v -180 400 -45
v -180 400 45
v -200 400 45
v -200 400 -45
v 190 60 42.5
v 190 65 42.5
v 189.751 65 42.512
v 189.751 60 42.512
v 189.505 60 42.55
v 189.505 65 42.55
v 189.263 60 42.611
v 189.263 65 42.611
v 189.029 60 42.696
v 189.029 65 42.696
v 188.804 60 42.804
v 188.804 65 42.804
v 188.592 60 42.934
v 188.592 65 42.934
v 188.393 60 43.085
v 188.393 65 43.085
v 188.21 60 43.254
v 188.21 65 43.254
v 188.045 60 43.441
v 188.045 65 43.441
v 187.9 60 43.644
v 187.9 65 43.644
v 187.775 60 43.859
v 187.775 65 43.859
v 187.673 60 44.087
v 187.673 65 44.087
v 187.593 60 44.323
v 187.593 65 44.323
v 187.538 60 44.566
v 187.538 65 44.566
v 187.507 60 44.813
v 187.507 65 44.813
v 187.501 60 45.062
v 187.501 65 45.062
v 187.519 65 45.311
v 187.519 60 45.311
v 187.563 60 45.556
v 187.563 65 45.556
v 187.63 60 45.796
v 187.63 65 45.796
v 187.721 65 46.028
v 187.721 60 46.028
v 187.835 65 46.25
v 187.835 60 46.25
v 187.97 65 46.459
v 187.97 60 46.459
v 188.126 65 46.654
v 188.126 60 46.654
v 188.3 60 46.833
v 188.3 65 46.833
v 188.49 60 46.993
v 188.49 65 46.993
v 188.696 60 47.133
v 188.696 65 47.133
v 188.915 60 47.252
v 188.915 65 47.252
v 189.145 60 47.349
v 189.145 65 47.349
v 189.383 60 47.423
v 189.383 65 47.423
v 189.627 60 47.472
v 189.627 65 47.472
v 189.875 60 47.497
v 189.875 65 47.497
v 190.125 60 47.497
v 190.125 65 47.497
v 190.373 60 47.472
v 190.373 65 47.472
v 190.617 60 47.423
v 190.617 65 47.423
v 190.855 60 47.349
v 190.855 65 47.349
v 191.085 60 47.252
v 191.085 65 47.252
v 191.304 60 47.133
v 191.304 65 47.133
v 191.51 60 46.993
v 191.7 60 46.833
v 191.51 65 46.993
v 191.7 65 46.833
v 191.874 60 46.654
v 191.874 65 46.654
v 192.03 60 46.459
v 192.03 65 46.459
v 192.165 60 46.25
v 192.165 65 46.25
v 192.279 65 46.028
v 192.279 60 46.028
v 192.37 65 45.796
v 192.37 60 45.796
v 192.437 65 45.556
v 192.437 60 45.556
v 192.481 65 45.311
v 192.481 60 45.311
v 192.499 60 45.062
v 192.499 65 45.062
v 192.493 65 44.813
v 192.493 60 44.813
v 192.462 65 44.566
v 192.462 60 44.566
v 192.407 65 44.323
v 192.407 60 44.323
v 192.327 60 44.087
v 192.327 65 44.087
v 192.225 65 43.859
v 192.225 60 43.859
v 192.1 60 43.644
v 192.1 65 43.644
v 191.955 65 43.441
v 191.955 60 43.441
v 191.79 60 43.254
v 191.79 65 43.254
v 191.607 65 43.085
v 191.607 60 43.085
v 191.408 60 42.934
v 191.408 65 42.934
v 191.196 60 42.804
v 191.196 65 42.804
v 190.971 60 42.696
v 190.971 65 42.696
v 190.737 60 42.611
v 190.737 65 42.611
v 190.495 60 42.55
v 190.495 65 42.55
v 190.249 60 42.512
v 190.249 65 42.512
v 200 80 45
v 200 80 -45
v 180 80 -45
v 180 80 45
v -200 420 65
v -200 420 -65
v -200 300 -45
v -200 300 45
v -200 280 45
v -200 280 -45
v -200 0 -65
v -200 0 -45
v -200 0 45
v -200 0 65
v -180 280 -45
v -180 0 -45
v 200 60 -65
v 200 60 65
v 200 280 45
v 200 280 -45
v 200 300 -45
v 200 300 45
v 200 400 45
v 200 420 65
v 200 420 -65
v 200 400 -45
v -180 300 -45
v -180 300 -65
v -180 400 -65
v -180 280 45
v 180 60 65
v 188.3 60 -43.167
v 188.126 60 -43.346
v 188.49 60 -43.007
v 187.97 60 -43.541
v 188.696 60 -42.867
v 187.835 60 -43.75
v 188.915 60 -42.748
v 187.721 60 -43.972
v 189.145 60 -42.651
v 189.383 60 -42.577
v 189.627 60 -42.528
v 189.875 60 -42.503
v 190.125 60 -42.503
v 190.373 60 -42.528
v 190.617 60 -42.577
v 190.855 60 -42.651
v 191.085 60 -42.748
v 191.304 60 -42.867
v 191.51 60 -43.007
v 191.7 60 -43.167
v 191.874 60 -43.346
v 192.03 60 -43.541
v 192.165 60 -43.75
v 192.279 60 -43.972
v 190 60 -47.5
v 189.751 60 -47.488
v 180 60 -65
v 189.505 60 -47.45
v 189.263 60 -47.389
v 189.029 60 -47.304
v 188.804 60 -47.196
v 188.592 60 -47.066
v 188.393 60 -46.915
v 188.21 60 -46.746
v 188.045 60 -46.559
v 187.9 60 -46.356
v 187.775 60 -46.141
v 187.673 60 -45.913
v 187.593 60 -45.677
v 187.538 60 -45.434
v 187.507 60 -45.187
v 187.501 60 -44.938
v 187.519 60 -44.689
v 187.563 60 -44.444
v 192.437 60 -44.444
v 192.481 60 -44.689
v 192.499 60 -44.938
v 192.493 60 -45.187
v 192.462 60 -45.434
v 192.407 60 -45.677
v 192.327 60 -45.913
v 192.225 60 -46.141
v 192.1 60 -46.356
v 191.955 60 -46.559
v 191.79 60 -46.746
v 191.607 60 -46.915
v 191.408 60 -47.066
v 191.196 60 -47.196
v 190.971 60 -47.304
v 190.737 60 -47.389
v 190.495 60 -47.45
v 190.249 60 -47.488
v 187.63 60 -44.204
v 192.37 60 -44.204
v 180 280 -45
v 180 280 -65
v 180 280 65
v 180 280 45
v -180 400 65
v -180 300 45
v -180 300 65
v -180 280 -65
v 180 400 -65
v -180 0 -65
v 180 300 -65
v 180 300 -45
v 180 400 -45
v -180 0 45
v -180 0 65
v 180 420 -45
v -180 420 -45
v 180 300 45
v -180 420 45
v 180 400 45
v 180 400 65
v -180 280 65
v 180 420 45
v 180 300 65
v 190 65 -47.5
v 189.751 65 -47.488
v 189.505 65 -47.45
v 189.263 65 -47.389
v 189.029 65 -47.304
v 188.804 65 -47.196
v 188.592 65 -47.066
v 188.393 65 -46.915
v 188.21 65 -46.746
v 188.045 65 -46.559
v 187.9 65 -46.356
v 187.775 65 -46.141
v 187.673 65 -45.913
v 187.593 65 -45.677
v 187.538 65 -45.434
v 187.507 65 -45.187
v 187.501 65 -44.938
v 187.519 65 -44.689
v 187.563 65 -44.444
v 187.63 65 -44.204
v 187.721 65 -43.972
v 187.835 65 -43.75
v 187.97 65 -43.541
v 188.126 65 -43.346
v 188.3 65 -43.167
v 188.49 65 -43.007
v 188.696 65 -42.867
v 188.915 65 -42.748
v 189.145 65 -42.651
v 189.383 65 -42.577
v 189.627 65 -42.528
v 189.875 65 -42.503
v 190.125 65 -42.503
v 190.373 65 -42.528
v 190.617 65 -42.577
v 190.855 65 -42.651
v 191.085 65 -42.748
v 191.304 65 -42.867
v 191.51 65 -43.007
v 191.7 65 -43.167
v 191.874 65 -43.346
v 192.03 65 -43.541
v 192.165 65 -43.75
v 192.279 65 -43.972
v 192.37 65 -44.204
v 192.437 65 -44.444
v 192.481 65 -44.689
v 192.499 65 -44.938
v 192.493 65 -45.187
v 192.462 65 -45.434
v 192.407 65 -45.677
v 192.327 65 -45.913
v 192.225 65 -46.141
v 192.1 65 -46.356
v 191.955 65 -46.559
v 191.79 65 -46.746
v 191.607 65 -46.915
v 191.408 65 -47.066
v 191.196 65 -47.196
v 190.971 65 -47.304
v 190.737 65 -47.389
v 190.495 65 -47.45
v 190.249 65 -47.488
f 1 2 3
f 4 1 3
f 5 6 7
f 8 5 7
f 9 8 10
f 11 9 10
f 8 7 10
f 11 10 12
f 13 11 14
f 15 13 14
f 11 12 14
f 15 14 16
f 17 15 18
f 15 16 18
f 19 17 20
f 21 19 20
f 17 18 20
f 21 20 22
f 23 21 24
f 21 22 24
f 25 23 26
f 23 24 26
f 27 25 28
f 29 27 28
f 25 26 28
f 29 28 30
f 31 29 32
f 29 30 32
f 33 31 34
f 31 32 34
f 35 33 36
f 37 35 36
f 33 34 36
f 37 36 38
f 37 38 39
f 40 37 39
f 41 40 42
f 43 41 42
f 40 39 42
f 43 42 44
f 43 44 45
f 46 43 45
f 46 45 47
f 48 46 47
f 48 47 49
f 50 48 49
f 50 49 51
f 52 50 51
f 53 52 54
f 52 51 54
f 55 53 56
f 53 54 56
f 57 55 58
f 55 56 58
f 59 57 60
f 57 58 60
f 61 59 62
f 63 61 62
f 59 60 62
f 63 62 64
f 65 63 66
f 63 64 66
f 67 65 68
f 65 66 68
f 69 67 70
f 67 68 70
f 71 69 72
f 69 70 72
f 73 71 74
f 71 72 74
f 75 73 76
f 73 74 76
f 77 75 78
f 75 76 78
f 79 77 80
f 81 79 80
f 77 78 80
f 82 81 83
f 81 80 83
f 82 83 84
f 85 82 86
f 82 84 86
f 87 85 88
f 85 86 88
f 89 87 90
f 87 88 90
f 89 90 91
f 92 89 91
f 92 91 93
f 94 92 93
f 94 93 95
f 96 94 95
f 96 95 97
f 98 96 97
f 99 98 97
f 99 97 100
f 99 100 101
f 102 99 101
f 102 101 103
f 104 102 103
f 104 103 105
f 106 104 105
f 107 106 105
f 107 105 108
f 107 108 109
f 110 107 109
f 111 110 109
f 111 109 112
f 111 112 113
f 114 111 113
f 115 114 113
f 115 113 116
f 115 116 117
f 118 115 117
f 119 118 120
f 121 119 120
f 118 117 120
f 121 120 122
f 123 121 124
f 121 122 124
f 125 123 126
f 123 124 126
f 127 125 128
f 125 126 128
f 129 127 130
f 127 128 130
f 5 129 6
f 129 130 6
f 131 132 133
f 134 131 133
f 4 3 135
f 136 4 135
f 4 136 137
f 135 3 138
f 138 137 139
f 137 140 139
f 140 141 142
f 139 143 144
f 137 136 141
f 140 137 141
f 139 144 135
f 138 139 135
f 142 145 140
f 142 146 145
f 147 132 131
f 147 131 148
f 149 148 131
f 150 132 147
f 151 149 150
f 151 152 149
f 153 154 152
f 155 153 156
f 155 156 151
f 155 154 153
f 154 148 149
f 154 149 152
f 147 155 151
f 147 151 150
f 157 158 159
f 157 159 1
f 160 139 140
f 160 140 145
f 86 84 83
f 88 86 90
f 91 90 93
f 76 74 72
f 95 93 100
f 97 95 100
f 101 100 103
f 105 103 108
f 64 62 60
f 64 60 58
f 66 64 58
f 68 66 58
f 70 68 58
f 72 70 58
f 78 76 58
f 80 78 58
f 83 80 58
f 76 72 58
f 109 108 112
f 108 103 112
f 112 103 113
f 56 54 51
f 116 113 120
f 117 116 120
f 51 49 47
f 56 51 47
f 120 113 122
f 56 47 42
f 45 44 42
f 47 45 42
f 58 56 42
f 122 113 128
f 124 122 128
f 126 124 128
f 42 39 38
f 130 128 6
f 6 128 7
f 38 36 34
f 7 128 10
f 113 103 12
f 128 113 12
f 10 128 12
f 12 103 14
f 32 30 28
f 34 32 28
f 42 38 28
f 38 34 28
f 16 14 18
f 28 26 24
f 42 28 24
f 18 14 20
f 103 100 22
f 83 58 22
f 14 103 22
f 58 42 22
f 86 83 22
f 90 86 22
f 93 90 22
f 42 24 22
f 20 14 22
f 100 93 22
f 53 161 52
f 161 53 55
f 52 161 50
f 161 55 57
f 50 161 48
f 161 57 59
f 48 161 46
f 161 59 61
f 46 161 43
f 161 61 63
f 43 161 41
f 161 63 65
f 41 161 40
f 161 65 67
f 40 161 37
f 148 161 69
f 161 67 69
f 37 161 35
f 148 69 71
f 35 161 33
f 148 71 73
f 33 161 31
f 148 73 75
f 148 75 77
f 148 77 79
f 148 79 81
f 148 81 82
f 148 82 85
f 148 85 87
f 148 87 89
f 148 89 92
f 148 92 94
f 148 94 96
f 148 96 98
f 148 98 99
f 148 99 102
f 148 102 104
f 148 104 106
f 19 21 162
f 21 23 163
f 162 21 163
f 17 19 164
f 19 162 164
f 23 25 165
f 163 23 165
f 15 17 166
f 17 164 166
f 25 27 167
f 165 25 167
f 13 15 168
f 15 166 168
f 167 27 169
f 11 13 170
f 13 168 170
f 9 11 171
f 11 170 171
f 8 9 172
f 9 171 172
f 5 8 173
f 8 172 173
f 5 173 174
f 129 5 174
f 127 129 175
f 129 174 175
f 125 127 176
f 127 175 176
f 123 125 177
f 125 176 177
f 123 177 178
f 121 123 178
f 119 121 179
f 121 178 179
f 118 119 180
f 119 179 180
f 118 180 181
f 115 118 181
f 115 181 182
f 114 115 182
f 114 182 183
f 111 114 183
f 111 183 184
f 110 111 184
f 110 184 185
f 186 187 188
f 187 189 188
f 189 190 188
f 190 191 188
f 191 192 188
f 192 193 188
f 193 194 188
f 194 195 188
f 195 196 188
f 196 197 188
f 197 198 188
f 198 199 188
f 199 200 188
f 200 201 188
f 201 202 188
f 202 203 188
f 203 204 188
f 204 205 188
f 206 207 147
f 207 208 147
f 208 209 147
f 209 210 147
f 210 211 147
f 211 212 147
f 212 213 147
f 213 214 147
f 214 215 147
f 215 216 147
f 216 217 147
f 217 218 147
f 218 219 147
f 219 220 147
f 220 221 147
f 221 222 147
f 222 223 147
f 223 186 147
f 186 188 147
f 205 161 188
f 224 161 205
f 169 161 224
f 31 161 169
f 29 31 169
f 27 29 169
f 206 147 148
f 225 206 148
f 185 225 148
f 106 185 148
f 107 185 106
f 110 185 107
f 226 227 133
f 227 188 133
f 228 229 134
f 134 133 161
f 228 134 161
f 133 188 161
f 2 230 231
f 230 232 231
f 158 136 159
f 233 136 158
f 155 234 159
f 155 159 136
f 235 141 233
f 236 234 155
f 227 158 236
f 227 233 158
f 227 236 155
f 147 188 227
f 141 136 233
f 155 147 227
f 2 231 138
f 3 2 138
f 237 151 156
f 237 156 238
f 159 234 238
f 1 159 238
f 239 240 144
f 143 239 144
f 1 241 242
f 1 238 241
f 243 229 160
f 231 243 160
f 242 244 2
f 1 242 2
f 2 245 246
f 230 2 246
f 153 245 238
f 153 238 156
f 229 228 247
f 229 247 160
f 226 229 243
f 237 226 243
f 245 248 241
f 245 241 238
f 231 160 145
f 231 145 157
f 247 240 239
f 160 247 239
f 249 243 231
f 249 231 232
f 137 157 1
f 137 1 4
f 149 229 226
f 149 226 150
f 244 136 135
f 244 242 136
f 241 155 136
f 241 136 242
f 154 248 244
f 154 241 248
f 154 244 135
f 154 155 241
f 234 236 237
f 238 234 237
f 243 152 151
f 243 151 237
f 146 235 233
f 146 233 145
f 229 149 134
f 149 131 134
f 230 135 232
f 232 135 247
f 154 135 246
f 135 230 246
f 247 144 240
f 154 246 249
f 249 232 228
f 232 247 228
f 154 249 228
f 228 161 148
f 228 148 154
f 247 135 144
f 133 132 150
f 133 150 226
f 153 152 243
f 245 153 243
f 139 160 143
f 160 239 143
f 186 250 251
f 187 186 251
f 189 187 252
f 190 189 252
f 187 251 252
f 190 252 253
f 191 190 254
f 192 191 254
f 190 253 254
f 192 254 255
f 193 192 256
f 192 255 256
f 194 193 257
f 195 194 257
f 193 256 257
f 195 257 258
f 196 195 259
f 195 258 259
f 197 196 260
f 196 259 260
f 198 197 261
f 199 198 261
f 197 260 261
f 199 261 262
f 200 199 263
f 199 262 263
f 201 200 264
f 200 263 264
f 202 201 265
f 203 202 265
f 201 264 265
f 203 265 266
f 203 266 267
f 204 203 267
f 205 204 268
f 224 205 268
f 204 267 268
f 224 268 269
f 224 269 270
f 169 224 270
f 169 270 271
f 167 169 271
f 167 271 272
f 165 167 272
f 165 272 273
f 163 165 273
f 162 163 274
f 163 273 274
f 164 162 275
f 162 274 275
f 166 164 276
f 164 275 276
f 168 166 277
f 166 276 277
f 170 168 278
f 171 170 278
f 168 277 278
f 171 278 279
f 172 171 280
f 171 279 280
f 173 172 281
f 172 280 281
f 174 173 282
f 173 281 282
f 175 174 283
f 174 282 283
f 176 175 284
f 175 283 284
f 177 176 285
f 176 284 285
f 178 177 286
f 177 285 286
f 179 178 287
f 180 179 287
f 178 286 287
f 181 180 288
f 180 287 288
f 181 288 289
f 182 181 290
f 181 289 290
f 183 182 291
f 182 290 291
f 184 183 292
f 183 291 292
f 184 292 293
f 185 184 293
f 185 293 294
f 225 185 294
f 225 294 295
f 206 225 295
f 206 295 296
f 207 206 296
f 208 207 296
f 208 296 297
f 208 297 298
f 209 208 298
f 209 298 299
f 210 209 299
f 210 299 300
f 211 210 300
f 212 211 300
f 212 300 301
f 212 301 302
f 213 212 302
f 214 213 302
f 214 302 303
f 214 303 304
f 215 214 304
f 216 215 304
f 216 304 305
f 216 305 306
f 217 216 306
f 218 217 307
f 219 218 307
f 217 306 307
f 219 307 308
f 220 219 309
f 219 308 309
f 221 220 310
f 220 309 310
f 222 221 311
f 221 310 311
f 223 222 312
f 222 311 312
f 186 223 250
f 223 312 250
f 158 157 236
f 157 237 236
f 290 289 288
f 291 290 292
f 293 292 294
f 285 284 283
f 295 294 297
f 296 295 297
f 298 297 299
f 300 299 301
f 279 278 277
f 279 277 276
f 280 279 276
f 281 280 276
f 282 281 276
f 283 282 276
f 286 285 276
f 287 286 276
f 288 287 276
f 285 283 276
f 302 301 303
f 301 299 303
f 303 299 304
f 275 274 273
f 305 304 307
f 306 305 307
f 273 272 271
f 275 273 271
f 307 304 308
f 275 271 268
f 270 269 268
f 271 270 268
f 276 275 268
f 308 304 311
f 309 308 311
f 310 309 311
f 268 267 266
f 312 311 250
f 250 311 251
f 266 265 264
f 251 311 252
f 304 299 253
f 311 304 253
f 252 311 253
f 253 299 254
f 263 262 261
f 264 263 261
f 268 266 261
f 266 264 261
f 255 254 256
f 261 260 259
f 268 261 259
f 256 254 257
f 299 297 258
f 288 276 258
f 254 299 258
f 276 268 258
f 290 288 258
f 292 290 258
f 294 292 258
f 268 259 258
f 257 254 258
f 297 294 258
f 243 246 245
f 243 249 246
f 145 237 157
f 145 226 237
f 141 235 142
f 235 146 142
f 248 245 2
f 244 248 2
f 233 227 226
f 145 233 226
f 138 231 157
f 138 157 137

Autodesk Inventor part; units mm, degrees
ref_plane "YZ Plane" through (0, 0, 0) normal (1, 0, 0) x (0, 1, 0)
ref_plane "XZ Plane" through (0, 0, 0) normal (0, 1, 0) x (-1, 0, 0)
ref_plane "XY Plane" through (0, 0, 0) normal (0, 0, 1) x (1, 0, 0)
sketch "Эскиз1" plane through (0, 0, 0) normal (0, 1, 0) x (-1, 0, 0)
  line L0 (-200, 65) -> (200, 65) construction
  line L1 (200, 65) -> (200, -65) construction
  line L2 (200, -65) -> (-200, -65) construction
  line L3 (-200, -65) -> (-200, 65) construction
  line L4 (-200, 65) -> (200, -65) construction
  line L5 (200, 65) -> (-200, -65) construction
  line L6 (200, 65) -> (180, 65)
  line L7 (180, 65) -> (180, 45)
  line L8 (180, 45) -> (200, 45)
  line L9 (200, 45) -> (200, 65)
  line L10 (200, -65) -> (180, -65)
  line L11 (180, -65) -> (180, -45)
  line L12 (180, -45) -> (200, -45)
  line L13 (200, -45) -> (200, -65)
  line L14 (-200, 65) -> (-180, 65)
  line L15 (-180, 65) -> (-180, 45)
  line L16 (-180, 45) -> (-200, 45)
  line L17 (-200, 45) -> (-200, 65)
  line L18 (-200, -65) -> (-180, -65)
  line L19 (-180, -65) -> (-180, -45)
  line L20 (-180, -45) -> (-200, -45)
  line L21 (-200, -45) -> (-200, -65)
  point P0 (0, 0)
  dimension "d0" = 400
  dimension "d1" = 130
  dimension "d2" = 20
  dimension "d3" = 20
  dimension "d4" = 20
  dimension "d5" = 20
  dimension "d6" = 20
  dimension "d7" = 20
  dimension "d8" = 20
  dimension "d9" = 20
extrude "Выдавливание1" add sketch "Эскиз1" along normal blind 400
sketch "Эскиз2" plane through (200, 0, 65) normal (1, 0, 0) x (0, 0, -1)
  line L0 (20, 400) -> (0, 400) projected
  line L1 (0, 400) -> (20, 400)
  line L2 (20, 400) -> (20, 420)
  line L3 (20, 420) -> (0, 420)
  line L4 (0, 420) -> (0, 400)
  line L5 (130, 0) -> (130, 400) projected
  line L6 (130, 400) -> (110, 400)
  line L7 (110, 400) -> (110, 420)
  line L8 (110, 420) -> (130, 420)
  line L9 (130, 420) -> (130, 400)
  line L10 (0, 0) -> (0, 400) projected
  line L11 (0, 280) -> (20, 280)
  line L12 (20, 280) -> (20, 300)
  line L13 (20, 300) -> (0, 300)
  line L14 (0, 300) -> (0, 280)
  line L15 (110, 300) -> (130, 300)
  line L16 (130, 300) -> (130, 280)
  line L17 (130, 280) -> (110, 280)
  line L18 (110, 280) -> (110, 300)
  point P0 (65, 0)
  point P1 (0, 300)
  dimension "d12" = 20
  dimension "d13" = 20
  dimension "d14" = 20
  dimension "d15" = 20
  dimension "d25" = 20
  dimension "d26" = 20
  dimension "d27" = 100
  dimension "d28" = 20
  dimension "d29" = 20
  dimension "d30" = 100
  dimension "d31" = 90
extrude "Выдавливание2" add sketch "Эскиз2" against normal blind 400
sketch "Эскиз3" plane through (-200, 420, 65) normal (0, 0, 1) x (1, 0, 0)
  line L0 (0, -420) -> (0, 0) projected
  line L1 (20, -420) -> (20, -20) projected
  line L2 (0, 0) -> (20, 0)
  line L3 (20, 0) -> (20, -20)
  line L4 (20, -20) -> (0, -20)
  line L5 (0, -20) -> (0, 0)
  line L6 (380, -420) -> (380, -20) projected
  line L7 (400, -420) -> (400, 0) projected
  line L8 (380, -20) -> (400, -20)
  line L9 (400, -20) -> (400, 0)
  line L10 (400, 0) -> (380, 0)
  line L11 (380, 0) -> (380, -20)
  line L12 (0, -140) -> (20, -140)
  line L13 (20, -140) -> (20, -120)
  line L14 (20, -120) -> (0, -120)
  line L15 (0, -120) -> (0, -140)
  line L16 (380, -420) -> (380, -20) projected
  line L17 (400, -420) -> (400, 0) projected
  line L18 (380, -140) -> (400, -140)
  line L19 (400, -140) -> (400, -120)
  line L20 (400, -120) -> (380, -120)
  line L21 (380, -120) -> (380, -140)
  point P0 (200, -420)
  point P1 (20, -120)
  point P2 (0, -120)
  point P3 (20, -140)
  dimension "d20" = 20
  dimension "d21" = 20
  dimension "d22" = 100
  dimension "d23" = 100
  dimension "d24" = 20
extrude "Выдавливание3" add sketch "Эскиз3" against normal blind 130 contours L0 L14 L1 L12 | L0 L2 L3 L4 | L6 L20 L7 L18 | L11 L10 L7 L8
sketch "Эскиз4" plane through (200, 420, -65) normal (0, 0, -1) x (-1, 0, 0)
  point P0 (200, -420)
sketch "Эскиз7" plane through (0, 0, 0) normal (0, -1, 0) x (1, 0, 0)
  line L0 (232.9472, 106.3053) -> (134.9615, 106.3053)
  line L1 (134.9615, 106.3053) -> (134.9615, -101.9914)
  line L2 (134.9615, -101.9914) -> (232.9472, -101.9914)
  line L3 (232.9472, -101.9914) -> (232.9472, 106.3053)
  point P0 (0, 0)
extrude "Выдавливание5" cut sketch "Эскиз7" against normal blind 80
sketch "Эскиз9" plane through (0, 0, 0) normal (0, 0, 1) x (1, 0, 0)
  line L0 (200, 80) -> (180, 80) projected
  line L1 (200, 80) -> (180, 80)
  line L2 (180, 80) -> (180, 60)
  line L3 (180, 60) -> (200, 60)
  line L4 (200, 60) -> (200, 80)
  point P0 (0, 0)
  dimension "d45" = 20
  dimension "d46" = 20
extrude "Выдавливание6" add sketch "Эскиз9" along normal mid plane 130
sketch "Эскиз11" plane through (180, 60, 65) normal (0, -1, 0) x (1, 0, 0)
  line L0 (0, -20) -> (20, -20) projected
  line L1 (20, -110) -> (0, -110) projected
  point P0 (-180, -65)
  point P1 (10, -20)
  point P2 (10, -110)
hole "Отверстие3" at (190, 60, 45) at (190, 60, -45) direction (0, 1, 0) diameter 5 depth 5
properties part number "Подлокотник"
